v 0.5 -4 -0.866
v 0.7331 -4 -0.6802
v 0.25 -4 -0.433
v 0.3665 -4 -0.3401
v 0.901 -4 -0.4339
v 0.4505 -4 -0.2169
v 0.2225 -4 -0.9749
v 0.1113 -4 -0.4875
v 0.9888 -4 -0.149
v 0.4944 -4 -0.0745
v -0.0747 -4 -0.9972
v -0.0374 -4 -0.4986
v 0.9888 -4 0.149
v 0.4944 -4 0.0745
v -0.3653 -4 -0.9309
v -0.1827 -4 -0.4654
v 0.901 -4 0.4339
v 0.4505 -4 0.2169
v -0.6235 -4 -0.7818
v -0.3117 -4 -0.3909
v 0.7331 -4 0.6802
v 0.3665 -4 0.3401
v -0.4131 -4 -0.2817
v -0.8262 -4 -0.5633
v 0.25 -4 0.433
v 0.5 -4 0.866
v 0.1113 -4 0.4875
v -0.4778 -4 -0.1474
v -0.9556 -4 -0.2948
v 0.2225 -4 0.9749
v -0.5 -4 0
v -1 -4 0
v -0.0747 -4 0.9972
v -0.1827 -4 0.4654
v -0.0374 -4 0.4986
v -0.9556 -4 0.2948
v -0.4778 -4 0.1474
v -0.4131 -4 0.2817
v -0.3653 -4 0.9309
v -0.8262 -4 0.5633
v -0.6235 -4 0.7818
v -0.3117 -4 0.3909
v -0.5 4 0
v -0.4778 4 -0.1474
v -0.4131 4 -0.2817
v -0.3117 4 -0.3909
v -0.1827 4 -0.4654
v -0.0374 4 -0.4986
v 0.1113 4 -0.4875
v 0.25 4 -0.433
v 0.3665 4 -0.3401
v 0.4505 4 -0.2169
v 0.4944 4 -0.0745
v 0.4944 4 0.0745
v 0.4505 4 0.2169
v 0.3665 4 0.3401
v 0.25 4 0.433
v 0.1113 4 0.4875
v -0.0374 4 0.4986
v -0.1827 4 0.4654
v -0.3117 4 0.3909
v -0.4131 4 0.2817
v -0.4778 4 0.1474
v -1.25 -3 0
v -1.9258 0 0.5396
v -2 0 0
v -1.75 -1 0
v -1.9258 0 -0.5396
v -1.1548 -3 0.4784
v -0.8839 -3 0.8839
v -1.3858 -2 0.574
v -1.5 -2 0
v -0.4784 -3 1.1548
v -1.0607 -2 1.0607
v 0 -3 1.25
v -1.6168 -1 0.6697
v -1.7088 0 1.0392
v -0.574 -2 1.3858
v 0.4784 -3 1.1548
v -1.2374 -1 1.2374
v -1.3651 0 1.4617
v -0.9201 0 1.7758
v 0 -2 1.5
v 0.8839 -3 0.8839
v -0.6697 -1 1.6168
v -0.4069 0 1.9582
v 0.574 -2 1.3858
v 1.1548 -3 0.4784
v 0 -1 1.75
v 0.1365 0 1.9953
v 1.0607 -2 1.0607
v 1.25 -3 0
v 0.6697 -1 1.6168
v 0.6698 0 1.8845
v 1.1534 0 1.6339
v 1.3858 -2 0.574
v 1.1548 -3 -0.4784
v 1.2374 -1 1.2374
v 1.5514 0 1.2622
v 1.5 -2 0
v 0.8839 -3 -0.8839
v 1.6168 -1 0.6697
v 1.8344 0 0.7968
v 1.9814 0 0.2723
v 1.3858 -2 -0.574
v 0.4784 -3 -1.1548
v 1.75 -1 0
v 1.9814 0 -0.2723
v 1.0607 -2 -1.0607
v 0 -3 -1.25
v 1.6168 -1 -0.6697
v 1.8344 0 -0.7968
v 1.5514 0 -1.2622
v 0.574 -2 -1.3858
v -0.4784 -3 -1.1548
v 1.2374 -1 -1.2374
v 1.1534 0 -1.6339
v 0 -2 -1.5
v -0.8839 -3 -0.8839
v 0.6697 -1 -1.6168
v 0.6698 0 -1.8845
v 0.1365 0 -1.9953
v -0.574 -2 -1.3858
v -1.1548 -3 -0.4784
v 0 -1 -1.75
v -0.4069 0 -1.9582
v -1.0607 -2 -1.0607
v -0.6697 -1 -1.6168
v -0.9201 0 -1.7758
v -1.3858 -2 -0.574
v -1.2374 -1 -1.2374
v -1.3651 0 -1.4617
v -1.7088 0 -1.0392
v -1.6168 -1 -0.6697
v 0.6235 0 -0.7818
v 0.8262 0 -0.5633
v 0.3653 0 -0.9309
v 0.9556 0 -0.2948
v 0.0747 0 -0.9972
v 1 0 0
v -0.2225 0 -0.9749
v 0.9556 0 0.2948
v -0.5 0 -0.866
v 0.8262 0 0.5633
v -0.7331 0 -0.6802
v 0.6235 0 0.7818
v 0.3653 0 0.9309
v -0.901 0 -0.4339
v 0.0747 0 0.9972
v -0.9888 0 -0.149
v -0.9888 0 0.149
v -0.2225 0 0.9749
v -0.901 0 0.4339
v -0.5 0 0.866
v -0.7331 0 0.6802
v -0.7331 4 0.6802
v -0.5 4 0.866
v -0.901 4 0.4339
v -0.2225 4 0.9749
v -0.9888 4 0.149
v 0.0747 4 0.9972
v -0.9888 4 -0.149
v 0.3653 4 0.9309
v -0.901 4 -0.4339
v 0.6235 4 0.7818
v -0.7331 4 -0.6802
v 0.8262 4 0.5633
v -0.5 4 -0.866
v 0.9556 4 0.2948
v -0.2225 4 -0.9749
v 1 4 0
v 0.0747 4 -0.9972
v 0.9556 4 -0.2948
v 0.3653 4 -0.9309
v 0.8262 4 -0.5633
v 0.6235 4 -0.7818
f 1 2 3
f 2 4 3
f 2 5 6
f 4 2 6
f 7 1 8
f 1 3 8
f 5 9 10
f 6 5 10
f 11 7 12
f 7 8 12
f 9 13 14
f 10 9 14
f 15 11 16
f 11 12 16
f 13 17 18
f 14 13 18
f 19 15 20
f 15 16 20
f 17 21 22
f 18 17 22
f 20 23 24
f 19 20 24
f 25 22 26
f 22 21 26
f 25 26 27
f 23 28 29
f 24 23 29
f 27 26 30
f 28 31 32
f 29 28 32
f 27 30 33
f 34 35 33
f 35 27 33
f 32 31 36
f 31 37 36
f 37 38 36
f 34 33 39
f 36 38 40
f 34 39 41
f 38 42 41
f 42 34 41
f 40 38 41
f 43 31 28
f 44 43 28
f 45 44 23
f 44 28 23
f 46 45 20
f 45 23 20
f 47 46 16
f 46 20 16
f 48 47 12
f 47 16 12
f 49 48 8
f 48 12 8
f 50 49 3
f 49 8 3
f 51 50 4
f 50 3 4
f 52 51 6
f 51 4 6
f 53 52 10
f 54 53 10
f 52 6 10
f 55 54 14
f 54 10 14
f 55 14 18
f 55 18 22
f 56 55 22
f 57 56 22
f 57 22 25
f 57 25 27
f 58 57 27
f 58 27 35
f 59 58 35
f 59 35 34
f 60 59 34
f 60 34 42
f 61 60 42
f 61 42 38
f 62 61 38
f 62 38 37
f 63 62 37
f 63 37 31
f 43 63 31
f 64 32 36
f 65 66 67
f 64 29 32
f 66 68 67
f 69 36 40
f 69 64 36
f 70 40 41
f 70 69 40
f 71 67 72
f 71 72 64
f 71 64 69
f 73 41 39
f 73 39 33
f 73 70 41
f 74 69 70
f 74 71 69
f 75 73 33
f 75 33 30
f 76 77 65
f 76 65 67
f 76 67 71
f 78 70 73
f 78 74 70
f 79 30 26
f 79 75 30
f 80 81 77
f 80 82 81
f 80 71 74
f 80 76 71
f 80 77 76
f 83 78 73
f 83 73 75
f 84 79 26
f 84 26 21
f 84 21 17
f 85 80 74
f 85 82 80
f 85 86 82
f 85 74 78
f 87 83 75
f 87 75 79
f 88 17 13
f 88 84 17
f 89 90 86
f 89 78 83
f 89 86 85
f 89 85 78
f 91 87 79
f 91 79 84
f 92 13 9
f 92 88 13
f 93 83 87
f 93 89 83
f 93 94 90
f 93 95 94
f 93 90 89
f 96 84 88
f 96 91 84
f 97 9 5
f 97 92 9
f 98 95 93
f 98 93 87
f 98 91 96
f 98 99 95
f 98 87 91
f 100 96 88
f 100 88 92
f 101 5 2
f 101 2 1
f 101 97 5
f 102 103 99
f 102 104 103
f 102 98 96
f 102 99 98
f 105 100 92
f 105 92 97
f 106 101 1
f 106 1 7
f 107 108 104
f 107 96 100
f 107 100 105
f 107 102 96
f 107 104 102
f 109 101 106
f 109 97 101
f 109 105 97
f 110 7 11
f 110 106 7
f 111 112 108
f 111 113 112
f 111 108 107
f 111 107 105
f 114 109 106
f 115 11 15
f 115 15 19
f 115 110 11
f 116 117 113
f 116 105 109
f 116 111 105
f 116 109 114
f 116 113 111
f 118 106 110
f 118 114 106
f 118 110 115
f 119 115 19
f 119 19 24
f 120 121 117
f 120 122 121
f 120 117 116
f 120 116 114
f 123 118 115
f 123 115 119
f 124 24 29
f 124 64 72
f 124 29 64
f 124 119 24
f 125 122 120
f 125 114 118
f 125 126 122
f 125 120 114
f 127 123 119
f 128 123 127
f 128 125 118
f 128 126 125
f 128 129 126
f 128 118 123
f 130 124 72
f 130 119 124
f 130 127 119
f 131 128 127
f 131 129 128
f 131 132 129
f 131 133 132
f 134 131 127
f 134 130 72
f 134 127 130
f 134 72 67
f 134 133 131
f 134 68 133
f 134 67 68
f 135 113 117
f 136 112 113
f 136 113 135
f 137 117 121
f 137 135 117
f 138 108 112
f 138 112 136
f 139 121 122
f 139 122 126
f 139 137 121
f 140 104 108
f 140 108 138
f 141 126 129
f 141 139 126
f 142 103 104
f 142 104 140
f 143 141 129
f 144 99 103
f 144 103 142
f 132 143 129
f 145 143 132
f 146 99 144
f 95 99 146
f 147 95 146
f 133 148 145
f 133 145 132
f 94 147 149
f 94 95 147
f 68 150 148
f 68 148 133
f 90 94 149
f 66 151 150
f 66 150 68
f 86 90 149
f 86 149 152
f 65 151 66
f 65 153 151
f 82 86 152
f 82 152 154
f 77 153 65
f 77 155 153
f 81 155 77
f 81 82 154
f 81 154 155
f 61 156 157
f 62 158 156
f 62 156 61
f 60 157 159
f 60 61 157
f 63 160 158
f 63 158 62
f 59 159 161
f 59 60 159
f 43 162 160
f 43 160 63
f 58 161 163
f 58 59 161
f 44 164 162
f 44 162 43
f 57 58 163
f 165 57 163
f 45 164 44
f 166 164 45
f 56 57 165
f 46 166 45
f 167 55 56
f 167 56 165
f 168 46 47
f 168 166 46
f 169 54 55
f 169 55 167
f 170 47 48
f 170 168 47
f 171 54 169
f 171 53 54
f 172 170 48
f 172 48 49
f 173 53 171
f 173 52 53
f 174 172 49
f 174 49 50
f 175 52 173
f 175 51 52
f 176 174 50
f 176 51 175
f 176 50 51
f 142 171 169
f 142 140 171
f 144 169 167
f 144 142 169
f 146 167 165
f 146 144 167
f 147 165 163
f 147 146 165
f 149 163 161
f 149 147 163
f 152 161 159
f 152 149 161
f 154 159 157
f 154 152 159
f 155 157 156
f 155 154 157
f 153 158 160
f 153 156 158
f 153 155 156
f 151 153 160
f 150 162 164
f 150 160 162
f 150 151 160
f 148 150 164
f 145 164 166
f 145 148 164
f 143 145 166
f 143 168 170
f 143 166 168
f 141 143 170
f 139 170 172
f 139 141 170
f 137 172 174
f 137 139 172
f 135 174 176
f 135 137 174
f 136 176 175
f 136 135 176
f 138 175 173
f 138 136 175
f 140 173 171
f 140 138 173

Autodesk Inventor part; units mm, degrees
ref_plane "YZ Plane" through (0, 0, 0) normal (1, 0, 0) x (0, 1, 0)
ref_plane "XY Plane" through (0, 0, 0) normal (0, 0, 1) x (1, 0, 0)
sketch "草图1" plane through (0, 0, 0) normal (0, 1, 0) x (-1, 0, 0)
  circle A0 centre (0, 0) radius 2
  dimension "d0" = 4
ref_plane "工作平面1" through (0, -4, 0) normal (0, 1, 0) x (-1, 0, 0)
sketch "草图2" plane through (0, -4, 0) normal (0, 1, 0) x (-1, 0, 0)
  circle A0 centre (0, 0) radius 1
  dimension "d2" = 2
loft "放样1" add profiles "草图1", "草图2"
sketch "草图3" plane through (0, 0, 0) normal (0, 1, 0) x (1, 0, 0)
  circle A0 centre (0, 0) radius 1
  dimension "d7" = 2
extrude "拉伸1" add sketch "草图3" along normal blind 4
sketch "草图4" plane through (0, -4, 0) normal (0, 1, 0) x (-1, 0, 0)
  circle A0 centre (0, 0) radius 0.5
  dimension "d10" = 1
extrude "拉伸2" cut sketch "草图4" along normal through all
properties part number "conver"
